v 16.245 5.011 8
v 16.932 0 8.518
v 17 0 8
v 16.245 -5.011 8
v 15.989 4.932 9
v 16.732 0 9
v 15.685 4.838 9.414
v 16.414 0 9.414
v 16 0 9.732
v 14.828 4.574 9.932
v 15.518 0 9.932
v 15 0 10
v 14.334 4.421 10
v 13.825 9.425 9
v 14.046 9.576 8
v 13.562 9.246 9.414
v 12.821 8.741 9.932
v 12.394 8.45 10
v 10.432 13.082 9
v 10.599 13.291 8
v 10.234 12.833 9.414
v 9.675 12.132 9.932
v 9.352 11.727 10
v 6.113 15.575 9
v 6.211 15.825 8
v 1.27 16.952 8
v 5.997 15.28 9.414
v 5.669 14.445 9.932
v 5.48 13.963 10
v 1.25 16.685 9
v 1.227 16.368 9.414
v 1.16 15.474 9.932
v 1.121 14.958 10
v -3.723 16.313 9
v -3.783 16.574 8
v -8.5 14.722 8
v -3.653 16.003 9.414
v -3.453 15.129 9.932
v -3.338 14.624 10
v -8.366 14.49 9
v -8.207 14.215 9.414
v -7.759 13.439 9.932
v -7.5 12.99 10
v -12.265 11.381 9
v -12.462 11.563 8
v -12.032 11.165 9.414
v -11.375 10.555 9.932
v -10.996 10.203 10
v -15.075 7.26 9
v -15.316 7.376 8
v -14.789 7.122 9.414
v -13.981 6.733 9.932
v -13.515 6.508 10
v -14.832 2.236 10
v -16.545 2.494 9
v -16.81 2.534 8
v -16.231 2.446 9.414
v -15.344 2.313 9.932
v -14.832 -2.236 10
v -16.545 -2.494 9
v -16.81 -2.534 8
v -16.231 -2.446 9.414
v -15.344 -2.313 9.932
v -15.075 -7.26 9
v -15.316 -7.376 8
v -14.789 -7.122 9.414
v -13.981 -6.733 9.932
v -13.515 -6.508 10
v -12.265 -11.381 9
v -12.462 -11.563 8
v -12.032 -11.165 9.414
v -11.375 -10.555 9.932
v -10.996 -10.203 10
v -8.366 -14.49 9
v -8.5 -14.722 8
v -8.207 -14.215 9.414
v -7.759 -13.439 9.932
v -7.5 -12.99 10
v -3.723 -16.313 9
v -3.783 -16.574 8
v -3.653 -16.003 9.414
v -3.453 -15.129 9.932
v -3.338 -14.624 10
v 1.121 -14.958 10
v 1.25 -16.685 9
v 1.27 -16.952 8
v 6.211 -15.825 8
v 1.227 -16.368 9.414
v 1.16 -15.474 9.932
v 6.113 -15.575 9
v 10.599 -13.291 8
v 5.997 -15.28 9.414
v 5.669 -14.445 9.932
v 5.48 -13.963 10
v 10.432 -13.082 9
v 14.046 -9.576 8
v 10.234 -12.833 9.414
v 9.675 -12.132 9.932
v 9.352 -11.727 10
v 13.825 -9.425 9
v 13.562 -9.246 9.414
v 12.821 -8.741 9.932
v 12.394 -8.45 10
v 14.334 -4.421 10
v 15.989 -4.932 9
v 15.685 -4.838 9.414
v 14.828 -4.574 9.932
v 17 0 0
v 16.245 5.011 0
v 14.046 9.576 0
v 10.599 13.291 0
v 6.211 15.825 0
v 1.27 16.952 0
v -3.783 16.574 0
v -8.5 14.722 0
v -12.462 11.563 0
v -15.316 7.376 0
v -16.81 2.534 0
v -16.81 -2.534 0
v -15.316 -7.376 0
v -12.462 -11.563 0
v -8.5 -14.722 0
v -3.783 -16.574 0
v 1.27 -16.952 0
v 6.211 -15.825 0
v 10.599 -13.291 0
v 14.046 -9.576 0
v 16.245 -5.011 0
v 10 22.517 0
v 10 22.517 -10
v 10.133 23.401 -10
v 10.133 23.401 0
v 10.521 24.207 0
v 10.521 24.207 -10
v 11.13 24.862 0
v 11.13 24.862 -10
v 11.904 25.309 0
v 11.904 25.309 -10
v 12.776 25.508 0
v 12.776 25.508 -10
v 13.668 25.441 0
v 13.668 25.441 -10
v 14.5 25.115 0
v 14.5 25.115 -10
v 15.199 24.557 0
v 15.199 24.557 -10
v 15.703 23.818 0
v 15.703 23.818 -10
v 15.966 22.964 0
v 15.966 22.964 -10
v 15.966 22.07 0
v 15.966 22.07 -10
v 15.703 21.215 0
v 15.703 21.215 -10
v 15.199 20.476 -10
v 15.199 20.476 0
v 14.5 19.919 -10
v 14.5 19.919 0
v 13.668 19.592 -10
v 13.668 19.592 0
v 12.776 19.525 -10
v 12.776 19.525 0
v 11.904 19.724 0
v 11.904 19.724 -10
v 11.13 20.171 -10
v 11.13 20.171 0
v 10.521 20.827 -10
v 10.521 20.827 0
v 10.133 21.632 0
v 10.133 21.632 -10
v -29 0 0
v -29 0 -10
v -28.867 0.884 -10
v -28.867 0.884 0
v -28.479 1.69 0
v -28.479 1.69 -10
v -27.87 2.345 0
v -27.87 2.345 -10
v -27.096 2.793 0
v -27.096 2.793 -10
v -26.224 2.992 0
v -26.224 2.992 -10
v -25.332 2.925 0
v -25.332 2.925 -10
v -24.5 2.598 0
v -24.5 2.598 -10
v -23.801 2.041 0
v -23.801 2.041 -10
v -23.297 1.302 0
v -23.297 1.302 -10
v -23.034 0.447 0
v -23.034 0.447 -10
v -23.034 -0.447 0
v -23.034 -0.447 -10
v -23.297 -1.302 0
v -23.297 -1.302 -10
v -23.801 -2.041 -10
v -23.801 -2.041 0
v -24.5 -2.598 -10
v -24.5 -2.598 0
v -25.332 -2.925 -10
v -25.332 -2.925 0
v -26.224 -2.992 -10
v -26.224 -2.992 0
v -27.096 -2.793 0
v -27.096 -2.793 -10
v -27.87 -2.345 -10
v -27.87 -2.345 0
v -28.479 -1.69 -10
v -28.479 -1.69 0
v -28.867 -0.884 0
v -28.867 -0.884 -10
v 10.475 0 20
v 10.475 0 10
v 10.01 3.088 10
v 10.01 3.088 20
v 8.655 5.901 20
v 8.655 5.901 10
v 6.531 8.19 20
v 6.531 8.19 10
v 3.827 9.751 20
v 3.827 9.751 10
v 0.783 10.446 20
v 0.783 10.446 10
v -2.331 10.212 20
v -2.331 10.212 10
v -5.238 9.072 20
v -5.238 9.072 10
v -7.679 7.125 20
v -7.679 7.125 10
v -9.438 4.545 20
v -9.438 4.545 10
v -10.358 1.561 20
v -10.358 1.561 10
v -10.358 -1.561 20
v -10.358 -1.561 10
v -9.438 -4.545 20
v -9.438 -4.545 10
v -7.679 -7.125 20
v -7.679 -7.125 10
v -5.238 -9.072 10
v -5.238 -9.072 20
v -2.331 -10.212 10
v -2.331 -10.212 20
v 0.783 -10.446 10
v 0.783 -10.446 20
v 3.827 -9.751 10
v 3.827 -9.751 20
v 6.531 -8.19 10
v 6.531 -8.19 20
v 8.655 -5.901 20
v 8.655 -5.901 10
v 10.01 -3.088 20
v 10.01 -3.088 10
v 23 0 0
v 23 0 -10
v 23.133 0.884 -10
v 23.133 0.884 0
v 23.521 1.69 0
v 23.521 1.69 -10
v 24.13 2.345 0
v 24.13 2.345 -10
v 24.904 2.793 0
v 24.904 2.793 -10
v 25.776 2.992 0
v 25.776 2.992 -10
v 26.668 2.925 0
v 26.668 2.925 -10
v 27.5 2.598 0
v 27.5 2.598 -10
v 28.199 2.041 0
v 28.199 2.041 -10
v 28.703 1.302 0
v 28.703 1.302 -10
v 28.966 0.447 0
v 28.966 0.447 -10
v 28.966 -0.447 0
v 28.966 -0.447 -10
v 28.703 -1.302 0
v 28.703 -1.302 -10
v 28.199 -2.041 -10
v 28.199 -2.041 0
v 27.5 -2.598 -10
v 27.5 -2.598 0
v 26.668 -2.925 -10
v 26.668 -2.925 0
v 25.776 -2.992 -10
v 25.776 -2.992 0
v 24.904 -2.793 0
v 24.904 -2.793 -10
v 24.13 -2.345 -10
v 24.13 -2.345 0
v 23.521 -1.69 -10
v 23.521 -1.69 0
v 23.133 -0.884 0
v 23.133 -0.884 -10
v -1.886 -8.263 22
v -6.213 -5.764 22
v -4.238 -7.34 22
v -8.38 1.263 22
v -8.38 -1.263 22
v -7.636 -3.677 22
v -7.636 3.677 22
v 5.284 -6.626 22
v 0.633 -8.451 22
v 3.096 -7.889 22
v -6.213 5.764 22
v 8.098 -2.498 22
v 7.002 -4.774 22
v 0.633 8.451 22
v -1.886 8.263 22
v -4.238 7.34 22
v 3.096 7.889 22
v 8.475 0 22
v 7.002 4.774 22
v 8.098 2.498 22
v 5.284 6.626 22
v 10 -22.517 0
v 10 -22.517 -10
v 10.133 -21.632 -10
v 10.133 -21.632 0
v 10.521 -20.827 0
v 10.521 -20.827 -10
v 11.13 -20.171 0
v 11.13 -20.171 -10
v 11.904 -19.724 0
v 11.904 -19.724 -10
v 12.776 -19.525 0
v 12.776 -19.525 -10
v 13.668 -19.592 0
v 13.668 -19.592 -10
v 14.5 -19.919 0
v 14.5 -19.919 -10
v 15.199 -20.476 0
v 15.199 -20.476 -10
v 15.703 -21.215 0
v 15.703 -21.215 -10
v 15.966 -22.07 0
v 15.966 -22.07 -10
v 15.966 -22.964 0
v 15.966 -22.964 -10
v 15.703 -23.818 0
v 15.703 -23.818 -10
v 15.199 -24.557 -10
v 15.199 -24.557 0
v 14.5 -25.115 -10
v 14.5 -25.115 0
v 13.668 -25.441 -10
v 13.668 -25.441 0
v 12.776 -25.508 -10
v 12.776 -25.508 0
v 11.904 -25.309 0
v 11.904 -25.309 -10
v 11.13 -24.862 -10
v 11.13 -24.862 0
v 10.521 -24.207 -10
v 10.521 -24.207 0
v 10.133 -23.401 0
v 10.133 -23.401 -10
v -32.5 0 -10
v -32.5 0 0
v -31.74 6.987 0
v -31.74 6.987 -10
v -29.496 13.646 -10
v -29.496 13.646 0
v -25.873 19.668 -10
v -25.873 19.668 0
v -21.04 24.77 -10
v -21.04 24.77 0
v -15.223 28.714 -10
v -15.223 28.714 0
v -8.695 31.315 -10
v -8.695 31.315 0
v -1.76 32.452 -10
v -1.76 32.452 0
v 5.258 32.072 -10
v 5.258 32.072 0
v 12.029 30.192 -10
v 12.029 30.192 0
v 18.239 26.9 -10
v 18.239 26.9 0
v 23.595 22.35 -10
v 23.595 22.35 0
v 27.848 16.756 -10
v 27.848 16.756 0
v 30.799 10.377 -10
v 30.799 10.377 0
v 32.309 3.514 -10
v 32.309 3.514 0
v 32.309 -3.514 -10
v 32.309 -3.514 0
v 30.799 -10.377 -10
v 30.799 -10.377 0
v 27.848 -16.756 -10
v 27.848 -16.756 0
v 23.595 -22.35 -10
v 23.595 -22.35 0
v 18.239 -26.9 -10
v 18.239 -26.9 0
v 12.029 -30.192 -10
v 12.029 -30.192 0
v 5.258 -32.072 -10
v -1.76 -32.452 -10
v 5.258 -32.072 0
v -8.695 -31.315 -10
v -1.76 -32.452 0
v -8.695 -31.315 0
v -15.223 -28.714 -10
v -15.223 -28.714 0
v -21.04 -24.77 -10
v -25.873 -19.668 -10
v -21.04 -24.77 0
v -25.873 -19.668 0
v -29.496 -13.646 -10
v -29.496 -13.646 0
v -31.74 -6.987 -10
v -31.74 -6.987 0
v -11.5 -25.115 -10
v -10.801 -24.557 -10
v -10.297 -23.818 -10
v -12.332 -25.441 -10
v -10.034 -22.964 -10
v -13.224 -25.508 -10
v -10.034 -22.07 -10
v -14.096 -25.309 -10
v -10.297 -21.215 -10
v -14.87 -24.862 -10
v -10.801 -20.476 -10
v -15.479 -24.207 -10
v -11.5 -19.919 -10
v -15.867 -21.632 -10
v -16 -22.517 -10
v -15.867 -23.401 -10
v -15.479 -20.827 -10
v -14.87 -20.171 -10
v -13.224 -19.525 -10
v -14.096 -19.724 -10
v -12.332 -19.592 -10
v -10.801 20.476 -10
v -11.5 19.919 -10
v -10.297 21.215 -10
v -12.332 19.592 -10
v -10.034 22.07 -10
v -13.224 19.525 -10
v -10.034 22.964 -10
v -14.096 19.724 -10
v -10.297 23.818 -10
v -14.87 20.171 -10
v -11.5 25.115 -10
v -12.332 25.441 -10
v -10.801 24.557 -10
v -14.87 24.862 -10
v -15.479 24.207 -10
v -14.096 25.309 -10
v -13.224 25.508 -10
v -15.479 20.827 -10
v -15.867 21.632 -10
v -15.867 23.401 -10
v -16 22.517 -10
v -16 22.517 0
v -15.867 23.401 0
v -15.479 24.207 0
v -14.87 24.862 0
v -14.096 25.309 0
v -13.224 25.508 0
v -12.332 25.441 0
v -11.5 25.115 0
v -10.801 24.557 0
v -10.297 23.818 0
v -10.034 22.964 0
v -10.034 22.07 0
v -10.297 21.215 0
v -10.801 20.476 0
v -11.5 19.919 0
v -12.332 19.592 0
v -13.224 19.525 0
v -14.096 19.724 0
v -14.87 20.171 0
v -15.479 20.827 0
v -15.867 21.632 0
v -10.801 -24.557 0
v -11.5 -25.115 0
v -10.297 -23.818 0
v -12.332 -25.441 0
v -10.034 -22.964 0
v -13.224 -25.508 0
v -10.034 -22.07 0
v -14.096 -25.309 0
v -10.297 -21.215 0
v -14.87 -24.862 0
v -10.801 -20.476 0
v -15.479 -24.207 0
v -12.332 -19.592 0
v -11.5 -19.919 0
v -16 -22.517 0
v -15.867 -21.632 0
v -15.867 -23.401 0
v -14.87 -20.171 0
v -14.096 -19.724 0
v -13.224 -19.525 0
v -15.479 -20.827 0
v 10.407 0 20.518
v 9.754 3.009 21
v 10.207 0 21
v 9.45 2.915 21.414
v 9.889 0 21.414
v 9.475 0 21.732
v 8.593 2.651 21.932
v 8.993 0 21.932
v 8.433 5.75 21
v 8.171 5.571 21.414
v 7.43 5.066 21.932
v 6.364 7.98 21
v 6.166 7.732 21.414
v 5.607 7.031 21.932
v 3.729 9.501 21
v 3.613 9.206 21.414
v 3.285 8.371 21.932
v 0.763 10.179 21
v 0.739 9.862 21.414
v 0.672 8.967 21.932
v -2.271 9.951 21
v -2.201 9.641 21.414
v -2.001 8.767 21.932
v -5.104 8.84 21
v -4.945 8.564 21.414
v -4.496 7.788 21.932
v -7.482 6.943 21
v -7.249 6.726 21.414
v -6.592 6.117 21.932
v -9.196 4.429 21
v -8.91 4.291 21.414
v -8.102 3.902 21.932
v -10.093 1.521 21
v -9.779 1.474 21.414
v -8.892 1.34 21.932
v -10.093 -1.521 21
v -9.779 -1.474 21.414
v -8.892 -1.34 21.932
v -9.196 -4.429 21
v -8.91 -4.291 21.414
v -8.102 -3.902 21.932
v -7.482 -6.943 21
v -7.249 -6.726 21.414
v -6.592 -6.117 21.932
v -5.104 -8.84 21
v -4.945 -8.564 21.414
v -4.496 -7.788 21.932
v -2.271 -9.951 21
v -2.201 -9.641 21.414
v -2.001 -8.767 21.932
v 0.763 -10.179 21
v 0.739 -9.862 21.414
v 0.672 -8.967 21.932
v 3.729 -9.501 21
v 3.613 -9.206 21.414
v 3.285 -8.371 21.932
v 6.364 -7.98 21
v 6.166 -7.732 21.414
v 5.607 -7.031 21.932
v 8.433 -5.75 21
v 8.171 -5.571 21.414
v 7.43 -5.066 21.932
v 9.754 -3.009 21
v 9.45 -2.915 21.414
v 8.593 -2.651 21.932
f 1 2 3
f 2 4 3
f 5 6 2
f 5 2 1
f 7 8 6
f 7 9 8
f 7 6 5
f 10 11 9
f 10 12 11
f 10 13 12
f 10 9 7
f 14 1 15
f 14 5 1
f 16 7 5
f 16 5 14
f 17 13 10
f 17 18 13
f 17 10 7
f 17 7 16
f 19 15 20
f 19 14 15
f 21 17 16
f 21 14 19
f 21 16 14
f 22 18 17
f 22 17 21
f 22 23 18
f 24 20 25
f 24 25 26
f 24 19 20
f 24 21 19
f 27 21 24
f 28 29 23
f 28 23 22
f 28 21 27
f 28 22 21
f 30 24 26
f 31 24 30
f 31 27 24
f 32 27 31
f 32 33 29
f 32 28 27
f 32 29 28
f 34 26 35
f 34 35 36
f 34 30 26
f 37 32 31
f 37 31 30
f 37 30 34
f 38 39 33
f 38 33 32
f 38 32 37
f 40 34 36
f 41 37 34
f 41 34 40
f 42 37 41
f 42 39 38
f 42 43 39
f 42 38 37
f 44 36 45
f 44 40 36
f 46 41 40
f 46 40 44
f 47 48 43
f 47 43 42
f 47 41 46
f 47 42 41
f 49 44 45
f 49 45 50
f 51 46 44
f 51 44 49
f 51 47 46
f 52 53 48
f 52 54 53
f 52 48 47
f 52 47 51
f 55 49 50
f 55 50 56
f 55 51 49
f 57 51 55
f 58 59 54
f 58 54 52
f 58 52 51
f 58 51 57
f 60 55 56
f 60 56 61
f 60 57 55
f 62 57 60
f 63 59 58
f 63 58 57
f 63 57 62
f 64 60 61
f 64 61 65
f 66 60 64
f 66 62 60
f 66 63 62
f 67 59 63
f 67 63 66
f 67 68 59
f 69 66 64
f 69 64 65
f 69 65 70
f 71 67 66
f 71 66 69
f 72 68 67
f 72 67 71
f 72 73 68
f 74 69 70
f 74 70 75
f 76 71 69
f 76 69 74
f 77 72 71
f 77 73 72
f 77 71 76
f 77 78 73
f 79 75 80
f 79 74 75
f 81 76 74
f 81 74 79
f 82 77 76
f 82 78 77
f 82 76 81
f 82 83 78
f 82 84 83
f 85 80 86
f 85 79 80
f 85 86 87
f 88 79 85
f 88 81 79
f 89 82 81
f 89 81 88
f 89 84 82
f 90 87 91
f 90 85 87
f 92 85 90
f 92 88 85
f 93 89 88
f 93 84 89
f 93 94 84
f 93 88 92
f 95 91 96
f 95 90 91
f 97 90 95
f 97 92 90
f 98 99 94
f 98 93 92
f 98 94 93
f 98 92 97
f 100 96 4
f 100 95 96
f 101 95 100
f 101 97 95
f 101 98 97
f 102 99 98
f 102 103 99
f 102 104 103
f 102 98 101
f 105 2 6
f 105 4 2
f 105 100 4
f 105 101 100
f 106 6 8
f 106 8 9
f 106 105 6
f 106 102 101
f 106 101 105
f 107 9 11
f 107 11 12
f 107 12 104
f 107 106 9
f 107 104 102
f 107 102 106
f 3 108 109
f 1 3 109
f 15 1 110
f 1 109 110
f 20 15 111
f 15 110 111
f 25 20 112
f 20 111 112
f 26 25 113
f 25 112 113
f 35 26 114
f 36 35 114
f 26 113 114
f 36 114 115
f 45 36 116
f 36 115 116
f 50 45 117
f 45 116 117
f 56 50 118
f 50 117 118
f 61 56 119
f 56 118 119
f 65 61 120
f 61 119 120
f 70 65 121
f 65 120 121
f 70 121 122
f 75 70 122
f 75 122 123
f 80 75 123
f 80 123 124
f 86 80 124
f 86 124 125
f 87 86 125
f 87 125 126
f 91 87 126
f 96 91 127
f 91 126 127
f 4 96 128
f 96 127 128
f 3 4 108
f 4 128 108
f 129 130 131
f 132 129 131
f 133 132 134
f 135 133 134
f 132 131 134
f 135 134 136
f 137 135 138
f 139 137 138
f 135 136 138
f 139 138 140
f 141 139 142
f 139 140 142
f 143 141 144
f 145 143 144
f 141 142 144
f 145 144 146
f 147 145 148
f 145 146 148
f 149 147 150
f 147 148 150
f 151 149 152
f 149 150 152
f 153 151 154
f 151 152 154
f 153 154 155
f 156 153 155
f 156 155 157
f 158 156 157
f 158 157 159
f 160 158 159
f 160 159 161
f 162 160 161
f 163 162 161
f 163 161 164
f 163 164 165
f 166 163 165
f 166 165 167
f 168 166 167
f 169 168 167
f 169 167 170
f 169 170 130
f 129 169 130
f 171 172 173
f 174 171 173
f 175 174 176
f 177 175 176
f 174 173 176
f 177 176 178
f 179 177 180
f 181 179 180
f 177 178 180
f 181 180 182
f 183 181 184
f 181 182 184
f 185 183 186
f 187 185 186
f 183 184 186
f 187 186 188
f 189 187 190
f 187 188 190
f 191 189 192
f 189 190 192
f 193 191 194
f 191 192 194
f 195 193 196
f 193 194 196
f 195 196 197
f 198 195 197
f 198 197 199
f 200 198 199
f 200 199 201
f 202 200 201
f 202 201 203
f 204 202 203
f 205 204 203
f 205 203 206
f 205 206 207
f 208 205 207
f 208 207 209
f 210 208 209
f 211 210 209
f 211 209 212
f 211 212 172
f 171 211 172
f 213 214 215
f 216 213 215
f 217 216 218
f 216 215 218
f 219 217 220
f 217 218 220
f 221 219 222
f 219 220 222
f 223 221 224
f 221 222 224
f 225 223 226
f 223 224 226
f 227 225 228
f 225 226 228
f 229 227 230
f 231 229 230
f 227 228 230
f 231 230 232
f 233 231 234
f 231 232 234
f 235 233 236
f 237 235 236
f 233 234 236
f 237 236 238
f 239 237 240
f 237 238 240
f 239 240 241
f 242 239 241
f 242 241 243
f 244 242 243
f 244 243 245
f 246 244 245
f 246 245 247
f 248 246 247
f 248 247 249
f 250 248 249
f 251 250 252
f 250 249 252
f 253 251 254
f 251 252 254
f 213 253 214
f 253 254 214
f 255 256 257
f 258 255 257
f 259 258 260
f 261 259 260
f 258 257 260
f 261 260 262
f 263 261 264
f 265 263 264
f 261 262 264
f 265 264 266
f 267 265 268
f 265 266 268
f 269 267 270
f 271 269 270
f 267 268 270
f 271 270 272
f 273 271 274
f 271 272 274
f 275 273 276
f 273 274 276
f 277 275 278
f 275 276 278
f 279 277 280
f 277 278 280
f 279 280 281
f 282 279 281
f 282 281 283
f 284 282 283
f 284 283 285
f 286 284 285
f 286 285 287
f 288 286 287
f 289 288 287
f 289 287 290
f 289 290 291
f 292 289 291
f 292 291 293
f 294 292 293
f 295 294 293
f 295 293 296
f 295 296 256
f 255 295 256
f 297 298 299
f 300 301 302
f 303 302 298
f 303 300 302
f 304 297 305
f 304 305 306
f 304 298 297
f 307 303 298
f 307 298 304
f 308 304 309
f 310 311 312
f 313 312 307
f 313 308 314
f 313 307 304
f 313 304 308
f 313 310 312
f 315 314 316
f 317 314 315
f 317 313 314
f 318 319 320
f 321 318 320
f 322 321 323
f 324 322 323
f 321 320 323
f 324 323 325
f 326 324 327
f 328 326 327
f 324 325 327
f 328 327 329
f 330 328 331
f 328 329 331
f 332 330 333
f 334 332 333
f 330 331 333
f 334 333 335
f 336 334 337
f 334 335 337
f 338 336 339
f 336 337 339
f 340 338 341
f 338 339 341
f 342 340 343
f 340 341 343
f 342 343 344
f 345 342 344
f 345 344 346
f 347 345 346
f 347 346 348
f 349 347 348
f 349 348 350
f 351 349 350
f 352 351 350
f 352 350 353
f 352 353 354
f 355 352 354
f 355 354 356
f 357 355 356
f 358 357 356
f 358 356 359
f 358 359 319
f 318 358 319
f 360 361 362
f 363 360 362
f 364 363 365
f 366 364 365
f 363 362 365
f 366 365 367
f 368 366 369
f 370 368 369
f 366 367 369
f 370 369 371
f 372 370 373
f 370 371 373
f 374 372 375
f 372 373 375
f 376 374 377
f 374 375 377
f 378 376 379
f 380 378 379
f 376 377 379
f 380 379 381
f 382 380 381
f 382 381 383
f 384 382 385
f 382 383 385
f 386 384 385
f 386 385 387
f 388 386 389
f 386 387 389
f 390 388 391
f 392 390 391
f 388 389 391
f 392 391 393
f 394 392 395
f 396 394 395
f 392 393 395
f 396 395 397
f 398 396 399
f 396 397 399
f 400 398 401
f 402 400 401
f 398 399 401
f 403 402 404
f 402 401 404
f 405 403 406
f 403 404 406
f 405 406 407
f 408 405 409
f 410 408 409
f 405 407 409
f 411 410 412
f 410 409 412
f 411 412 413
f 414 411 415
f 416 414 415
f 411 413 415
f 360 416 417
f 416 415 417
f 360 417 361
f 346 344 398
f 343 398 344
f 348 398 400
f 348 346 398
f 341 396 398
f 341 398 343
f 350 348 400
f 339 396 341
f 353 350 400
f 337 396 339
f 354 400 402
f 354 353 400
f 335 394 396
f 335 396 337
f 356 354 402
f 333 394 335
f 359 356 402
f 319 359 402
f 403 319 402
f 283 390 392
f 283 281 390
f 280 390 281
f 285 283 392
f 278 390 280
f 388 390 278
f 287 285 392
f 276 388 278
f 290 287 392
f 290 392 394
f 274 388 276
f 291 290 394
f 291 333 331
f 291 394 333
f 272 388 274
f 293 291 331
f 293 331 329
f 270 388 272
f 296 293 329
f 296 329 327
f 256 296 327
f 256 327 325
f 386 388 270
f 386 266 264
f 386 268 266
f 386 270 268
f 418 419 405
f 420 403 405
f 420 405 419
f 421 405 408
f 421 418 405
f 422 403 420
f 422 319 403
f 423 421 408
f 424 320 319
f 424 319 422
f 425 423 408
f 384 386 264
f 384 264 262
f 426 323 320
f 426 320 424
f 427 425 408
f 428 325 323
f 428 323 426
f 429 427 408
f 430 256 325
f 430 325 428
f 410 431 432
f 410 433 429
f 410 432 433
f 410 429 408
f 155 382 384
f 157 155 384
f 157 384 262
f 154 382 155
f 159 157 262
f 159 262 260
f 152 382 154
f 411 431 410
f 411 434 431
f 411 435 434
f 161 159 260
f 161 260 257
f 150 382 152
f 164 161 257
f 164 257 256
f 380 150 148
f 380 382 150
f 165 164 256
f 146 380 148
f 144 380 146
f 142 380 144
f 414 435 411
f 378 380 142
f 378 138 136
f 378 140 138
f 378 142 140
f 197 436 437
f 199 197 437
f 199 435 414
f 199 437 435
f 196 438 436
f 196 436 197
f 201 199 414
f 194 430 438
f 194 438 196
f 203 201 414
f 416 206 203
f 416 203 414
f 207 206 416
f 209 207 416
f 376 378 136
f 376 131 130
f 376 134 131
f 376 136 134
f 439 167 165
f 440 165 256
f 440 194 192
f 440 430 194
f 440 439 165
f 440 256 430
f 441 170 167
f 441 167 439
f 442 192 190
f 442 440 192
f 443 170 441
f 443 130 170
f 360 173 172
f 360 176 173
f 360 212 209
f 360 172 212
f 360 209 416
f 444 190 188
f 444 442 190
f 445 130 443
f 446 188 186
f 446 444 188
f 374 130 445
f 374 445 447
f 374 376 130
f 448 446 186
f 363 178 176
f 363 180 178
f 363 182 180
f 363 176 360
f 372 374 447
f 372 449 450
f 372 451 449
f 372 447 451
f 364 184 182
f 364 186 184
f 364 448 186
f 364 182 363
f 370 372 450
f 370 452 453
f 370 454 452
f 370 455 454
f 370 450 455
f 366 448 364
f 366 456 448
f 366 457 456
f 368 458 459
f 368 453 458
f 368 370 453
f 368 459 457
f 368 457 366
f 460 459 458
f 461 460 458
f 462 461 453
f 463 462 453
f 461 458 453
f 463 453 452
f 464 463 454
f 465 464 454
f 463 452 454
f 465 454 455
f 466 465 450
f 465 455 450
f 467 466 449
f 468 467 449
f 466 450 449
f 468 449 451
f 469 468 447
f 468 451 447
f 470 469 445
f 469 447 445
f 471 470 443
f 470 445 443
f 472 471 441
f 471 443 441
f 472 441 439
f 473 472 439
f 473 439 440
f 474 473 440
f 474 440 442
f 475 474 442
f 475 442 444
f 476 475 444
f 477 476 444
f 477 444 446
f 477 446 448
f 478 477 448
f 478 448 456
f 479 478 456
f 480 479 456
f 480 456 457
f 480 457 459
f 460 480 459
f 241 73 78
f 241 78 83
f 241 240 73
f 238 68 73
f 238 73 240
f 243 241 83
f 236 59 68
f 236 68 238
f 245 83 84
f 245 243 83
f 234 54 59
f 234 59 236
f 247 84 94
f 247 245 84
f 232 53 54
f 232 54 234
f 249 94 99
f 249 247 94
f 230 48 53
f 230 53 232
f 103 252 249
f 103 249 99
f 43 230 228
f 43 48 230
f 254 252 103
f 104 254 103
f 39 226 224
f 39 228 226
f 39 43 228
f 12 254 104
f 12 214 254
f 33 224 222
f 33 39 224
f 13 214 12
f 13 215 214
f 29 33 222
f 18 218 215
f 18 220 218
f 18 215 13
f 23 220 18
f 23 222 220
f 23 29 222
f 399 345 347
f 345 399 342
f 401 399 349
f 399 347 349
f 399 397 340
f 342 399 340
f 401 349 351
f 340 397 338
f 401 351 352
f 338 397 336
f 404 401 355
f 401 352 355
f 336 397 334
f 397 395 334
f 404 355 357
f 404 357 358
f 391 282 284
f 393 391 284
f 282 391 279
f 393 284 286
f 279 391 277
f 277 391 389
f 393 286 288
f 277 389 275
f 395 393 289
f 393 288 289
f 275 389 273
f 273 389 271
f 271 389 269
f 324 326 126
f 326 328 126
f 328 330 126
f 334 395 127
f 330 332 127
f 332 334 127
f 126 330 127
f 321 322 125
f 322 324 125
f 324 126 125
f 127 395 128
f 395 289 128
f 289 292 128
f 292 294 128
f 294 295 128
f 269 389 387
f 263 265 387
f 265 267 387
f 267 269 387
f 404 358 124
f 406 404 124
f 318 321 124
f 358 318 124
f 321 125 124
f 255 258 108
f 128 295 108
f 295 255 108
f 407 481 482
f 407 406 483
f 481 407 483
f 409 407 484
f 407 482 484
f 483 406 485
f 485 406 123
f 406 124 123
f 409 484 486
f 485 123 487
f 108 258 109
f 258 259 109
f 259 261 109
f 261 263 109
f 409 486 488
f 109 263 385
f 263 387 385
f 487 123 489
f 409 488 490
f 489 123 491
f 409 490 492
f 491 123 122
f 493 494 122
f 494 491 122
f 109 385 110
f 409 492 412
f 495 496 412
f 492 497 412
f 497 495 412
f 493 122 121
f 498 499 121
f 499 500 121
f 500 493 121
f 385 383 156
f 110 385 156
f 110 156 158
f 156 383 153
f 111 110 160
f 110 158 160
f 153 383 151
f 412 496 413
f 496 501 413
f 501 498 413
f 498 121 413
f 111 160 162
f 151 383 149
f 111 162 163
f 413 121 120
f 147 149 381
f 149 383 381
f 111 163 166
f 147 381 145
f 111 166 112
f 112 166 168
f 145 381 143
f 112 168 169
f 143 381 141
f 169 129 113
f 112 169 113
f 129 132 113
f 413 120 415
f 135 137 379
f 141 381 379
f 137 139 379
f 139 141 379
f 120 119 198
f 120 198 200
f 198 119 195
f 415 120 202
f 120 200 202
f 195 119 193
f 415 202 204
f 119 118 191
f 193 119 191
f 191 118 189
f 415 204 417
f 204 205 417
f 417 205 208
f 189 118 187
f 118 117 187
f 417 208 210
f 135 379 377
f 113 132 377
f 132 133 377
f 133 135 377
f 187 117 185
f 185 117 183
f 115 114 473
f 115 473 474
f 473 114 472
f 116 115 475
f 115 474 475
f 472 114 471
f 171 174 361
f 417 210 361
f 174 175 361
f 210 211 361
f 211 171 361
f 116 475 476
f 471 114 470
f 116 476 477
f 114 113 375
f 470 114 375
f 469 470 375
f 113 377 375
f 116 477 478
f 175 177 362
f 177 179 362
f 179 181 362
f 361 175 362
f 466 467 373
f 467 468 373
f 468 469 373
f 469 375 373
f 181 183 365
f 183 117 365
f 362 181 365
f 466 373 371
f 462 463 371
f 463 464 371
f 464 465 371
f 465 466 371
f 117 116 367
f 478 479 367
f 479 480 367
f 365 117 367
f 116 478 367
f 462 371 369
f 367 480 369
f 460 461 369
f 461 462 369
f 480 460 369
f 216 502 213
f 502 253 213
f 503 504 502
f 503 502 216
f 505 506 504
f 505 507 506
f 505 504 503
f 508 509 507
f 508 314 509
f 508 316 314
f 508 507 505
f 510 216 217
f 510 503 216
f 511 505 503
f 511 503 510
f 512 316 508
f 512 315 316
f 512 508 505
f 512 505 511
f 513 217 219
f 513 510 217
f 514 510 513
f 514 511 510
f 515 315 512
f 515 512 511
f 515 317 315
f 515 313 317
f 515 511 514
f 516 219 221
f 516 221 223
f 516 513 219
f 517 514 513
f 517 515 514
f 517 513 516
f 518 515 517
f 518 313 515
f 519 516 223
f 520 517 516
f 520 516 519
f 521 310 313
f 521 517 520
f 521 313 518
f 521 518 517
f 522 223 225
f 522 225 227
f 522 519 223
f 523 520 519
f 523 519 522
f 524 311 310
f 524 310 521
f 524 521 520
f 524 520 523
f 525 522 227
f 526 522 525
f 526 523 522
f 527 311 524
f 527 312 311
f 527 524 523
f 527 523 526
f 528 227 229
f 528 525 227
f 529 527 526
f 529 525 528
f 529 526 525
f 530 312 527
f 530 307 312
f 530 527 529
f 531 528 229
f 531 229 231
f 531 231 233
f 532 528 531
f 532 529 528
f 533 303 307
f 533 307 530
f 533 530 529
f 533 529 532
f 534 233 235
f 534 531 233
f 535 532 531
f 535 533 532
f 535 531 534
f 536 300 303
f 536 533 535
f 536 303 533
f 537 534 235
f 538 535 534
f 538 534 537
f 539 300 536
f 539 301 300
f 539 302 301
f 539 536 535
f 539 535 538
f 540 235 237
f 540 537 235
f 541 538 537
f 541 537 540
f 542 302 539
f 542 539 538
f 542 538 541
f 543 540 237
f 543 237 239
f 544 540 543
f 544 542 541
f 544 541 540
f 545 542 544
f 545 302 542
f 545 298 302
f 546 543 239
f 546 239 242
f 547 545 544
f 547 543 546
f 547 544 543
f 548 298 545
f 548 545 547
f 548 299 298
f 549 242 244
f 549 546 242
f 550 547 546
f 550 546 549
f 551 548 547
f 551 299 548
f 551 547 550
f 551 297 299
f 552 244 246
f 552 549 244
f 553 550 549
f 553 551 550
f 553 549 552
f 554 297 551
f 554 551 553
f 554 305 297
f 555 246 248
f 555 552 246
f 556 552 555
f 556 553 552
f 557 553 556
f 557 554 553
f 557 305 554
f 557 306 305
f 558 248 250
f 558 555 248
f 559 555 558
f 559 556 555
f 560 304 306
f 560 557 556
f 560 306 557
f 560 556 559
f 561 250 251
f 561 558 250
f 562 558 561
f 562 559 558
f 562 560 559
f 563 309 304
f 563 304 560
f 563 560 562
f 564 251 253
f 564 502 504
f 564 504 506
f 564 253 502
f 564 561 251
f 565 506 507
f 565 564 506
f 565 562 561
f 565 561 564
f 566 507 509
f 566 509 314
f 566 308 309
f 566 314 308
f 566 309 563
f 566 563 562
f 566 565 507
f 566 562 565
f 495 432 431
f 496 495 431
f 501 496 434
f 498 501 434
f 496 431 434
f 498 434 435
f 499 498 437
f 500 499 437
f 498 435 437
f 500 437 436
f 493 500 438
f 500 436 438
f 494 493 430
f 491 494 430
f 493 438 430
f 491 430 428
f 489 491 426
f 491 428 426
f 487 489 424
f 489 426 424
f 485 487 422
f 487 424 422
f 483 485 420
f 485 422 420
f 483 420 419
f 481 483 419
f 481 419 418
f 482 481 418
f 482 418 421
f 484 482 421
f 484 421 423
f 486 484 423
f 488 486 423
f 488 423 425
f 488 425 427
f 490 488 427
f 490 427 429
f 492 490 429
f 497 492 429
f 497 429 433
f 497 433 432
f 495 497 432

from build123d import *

# Parameters (mm, degrees)
SKETCH1_R           = 17
BOSS_EXTRUDE1_DEPTH = 10
SKETCH2_R           = 10.475
BOSS_EXTRUDE2_DEPTH = 12
FILLET1_R           = 2
SKETCH3_R           = 32.5
BOSS_EXTRUDE3_DEPTH = 10
SKETCH4_R           = 3
CUT_EXTRUDE1_DEPTH  = 57.004464108


with BuildPart() as part:
    # Sketch1 → Boss-Extrude1 (new body)
    with BuildSketch(Plane.XY):
        Circle(SKETCH1_R)
    extrude(amount=BOSS_EXTRUDE1_DEPTH)

    # Sketch2 → Boss-Extrude2 (add)
    with BuildSketch(Plane.XY.offset(10)):
        Circle(SKETCH2_R)
    extrude(amount=BOSS_EXTRUDE2_DEPTH)

    # Fillet1
    fillet1_edges = [part.edges().sort_by_distance(p)[0] for p in [
        (-17, 0, 10),
        (-10.475, 0, 22),
    ]]
    fillet(fillet1_edges, radius=FILLET1_R)

    # Sketch3 → Boss-Extrude3 (add)
    with BuildSketch(Plane(origin=(0, 0, 0), x_dir=(-1, 0, 0), z_dir=(0, 0, -1))):
        Circle(SKETCH3_R)
    extrude(amount=BOSS_EXTRUDE3_DEPTH)

    # Sketch4 → Cut-Extrude1 (cut, through all)
    with BuildSketch(Plane(origin=(0, 0, -10), x_dir=(-1, 0, 0), z_dir=(0, 0, -1))):
        with Locations((26, 0)):
            Circle(SKETCH4_R)
        with Locations((13, -22.516660498)):
            Circle(SKETCH4_R)
        with Locations((-13, -22.516660498)):
            Circle(SKETCH4_R)
        with Locations((-26, 0)):
            Circle(SKETCH4_R)
        with Locations((-13, 22.516660498)):
            Circle(SKETCH4_R)
        with Locations((13, 22.516660498)):
            Circle(SKETCH4_R)
    extrude(amount=-CUT_EXTRUDE1_DEPTH, mode=Mode.SUBTRACT)


solid = part.part
